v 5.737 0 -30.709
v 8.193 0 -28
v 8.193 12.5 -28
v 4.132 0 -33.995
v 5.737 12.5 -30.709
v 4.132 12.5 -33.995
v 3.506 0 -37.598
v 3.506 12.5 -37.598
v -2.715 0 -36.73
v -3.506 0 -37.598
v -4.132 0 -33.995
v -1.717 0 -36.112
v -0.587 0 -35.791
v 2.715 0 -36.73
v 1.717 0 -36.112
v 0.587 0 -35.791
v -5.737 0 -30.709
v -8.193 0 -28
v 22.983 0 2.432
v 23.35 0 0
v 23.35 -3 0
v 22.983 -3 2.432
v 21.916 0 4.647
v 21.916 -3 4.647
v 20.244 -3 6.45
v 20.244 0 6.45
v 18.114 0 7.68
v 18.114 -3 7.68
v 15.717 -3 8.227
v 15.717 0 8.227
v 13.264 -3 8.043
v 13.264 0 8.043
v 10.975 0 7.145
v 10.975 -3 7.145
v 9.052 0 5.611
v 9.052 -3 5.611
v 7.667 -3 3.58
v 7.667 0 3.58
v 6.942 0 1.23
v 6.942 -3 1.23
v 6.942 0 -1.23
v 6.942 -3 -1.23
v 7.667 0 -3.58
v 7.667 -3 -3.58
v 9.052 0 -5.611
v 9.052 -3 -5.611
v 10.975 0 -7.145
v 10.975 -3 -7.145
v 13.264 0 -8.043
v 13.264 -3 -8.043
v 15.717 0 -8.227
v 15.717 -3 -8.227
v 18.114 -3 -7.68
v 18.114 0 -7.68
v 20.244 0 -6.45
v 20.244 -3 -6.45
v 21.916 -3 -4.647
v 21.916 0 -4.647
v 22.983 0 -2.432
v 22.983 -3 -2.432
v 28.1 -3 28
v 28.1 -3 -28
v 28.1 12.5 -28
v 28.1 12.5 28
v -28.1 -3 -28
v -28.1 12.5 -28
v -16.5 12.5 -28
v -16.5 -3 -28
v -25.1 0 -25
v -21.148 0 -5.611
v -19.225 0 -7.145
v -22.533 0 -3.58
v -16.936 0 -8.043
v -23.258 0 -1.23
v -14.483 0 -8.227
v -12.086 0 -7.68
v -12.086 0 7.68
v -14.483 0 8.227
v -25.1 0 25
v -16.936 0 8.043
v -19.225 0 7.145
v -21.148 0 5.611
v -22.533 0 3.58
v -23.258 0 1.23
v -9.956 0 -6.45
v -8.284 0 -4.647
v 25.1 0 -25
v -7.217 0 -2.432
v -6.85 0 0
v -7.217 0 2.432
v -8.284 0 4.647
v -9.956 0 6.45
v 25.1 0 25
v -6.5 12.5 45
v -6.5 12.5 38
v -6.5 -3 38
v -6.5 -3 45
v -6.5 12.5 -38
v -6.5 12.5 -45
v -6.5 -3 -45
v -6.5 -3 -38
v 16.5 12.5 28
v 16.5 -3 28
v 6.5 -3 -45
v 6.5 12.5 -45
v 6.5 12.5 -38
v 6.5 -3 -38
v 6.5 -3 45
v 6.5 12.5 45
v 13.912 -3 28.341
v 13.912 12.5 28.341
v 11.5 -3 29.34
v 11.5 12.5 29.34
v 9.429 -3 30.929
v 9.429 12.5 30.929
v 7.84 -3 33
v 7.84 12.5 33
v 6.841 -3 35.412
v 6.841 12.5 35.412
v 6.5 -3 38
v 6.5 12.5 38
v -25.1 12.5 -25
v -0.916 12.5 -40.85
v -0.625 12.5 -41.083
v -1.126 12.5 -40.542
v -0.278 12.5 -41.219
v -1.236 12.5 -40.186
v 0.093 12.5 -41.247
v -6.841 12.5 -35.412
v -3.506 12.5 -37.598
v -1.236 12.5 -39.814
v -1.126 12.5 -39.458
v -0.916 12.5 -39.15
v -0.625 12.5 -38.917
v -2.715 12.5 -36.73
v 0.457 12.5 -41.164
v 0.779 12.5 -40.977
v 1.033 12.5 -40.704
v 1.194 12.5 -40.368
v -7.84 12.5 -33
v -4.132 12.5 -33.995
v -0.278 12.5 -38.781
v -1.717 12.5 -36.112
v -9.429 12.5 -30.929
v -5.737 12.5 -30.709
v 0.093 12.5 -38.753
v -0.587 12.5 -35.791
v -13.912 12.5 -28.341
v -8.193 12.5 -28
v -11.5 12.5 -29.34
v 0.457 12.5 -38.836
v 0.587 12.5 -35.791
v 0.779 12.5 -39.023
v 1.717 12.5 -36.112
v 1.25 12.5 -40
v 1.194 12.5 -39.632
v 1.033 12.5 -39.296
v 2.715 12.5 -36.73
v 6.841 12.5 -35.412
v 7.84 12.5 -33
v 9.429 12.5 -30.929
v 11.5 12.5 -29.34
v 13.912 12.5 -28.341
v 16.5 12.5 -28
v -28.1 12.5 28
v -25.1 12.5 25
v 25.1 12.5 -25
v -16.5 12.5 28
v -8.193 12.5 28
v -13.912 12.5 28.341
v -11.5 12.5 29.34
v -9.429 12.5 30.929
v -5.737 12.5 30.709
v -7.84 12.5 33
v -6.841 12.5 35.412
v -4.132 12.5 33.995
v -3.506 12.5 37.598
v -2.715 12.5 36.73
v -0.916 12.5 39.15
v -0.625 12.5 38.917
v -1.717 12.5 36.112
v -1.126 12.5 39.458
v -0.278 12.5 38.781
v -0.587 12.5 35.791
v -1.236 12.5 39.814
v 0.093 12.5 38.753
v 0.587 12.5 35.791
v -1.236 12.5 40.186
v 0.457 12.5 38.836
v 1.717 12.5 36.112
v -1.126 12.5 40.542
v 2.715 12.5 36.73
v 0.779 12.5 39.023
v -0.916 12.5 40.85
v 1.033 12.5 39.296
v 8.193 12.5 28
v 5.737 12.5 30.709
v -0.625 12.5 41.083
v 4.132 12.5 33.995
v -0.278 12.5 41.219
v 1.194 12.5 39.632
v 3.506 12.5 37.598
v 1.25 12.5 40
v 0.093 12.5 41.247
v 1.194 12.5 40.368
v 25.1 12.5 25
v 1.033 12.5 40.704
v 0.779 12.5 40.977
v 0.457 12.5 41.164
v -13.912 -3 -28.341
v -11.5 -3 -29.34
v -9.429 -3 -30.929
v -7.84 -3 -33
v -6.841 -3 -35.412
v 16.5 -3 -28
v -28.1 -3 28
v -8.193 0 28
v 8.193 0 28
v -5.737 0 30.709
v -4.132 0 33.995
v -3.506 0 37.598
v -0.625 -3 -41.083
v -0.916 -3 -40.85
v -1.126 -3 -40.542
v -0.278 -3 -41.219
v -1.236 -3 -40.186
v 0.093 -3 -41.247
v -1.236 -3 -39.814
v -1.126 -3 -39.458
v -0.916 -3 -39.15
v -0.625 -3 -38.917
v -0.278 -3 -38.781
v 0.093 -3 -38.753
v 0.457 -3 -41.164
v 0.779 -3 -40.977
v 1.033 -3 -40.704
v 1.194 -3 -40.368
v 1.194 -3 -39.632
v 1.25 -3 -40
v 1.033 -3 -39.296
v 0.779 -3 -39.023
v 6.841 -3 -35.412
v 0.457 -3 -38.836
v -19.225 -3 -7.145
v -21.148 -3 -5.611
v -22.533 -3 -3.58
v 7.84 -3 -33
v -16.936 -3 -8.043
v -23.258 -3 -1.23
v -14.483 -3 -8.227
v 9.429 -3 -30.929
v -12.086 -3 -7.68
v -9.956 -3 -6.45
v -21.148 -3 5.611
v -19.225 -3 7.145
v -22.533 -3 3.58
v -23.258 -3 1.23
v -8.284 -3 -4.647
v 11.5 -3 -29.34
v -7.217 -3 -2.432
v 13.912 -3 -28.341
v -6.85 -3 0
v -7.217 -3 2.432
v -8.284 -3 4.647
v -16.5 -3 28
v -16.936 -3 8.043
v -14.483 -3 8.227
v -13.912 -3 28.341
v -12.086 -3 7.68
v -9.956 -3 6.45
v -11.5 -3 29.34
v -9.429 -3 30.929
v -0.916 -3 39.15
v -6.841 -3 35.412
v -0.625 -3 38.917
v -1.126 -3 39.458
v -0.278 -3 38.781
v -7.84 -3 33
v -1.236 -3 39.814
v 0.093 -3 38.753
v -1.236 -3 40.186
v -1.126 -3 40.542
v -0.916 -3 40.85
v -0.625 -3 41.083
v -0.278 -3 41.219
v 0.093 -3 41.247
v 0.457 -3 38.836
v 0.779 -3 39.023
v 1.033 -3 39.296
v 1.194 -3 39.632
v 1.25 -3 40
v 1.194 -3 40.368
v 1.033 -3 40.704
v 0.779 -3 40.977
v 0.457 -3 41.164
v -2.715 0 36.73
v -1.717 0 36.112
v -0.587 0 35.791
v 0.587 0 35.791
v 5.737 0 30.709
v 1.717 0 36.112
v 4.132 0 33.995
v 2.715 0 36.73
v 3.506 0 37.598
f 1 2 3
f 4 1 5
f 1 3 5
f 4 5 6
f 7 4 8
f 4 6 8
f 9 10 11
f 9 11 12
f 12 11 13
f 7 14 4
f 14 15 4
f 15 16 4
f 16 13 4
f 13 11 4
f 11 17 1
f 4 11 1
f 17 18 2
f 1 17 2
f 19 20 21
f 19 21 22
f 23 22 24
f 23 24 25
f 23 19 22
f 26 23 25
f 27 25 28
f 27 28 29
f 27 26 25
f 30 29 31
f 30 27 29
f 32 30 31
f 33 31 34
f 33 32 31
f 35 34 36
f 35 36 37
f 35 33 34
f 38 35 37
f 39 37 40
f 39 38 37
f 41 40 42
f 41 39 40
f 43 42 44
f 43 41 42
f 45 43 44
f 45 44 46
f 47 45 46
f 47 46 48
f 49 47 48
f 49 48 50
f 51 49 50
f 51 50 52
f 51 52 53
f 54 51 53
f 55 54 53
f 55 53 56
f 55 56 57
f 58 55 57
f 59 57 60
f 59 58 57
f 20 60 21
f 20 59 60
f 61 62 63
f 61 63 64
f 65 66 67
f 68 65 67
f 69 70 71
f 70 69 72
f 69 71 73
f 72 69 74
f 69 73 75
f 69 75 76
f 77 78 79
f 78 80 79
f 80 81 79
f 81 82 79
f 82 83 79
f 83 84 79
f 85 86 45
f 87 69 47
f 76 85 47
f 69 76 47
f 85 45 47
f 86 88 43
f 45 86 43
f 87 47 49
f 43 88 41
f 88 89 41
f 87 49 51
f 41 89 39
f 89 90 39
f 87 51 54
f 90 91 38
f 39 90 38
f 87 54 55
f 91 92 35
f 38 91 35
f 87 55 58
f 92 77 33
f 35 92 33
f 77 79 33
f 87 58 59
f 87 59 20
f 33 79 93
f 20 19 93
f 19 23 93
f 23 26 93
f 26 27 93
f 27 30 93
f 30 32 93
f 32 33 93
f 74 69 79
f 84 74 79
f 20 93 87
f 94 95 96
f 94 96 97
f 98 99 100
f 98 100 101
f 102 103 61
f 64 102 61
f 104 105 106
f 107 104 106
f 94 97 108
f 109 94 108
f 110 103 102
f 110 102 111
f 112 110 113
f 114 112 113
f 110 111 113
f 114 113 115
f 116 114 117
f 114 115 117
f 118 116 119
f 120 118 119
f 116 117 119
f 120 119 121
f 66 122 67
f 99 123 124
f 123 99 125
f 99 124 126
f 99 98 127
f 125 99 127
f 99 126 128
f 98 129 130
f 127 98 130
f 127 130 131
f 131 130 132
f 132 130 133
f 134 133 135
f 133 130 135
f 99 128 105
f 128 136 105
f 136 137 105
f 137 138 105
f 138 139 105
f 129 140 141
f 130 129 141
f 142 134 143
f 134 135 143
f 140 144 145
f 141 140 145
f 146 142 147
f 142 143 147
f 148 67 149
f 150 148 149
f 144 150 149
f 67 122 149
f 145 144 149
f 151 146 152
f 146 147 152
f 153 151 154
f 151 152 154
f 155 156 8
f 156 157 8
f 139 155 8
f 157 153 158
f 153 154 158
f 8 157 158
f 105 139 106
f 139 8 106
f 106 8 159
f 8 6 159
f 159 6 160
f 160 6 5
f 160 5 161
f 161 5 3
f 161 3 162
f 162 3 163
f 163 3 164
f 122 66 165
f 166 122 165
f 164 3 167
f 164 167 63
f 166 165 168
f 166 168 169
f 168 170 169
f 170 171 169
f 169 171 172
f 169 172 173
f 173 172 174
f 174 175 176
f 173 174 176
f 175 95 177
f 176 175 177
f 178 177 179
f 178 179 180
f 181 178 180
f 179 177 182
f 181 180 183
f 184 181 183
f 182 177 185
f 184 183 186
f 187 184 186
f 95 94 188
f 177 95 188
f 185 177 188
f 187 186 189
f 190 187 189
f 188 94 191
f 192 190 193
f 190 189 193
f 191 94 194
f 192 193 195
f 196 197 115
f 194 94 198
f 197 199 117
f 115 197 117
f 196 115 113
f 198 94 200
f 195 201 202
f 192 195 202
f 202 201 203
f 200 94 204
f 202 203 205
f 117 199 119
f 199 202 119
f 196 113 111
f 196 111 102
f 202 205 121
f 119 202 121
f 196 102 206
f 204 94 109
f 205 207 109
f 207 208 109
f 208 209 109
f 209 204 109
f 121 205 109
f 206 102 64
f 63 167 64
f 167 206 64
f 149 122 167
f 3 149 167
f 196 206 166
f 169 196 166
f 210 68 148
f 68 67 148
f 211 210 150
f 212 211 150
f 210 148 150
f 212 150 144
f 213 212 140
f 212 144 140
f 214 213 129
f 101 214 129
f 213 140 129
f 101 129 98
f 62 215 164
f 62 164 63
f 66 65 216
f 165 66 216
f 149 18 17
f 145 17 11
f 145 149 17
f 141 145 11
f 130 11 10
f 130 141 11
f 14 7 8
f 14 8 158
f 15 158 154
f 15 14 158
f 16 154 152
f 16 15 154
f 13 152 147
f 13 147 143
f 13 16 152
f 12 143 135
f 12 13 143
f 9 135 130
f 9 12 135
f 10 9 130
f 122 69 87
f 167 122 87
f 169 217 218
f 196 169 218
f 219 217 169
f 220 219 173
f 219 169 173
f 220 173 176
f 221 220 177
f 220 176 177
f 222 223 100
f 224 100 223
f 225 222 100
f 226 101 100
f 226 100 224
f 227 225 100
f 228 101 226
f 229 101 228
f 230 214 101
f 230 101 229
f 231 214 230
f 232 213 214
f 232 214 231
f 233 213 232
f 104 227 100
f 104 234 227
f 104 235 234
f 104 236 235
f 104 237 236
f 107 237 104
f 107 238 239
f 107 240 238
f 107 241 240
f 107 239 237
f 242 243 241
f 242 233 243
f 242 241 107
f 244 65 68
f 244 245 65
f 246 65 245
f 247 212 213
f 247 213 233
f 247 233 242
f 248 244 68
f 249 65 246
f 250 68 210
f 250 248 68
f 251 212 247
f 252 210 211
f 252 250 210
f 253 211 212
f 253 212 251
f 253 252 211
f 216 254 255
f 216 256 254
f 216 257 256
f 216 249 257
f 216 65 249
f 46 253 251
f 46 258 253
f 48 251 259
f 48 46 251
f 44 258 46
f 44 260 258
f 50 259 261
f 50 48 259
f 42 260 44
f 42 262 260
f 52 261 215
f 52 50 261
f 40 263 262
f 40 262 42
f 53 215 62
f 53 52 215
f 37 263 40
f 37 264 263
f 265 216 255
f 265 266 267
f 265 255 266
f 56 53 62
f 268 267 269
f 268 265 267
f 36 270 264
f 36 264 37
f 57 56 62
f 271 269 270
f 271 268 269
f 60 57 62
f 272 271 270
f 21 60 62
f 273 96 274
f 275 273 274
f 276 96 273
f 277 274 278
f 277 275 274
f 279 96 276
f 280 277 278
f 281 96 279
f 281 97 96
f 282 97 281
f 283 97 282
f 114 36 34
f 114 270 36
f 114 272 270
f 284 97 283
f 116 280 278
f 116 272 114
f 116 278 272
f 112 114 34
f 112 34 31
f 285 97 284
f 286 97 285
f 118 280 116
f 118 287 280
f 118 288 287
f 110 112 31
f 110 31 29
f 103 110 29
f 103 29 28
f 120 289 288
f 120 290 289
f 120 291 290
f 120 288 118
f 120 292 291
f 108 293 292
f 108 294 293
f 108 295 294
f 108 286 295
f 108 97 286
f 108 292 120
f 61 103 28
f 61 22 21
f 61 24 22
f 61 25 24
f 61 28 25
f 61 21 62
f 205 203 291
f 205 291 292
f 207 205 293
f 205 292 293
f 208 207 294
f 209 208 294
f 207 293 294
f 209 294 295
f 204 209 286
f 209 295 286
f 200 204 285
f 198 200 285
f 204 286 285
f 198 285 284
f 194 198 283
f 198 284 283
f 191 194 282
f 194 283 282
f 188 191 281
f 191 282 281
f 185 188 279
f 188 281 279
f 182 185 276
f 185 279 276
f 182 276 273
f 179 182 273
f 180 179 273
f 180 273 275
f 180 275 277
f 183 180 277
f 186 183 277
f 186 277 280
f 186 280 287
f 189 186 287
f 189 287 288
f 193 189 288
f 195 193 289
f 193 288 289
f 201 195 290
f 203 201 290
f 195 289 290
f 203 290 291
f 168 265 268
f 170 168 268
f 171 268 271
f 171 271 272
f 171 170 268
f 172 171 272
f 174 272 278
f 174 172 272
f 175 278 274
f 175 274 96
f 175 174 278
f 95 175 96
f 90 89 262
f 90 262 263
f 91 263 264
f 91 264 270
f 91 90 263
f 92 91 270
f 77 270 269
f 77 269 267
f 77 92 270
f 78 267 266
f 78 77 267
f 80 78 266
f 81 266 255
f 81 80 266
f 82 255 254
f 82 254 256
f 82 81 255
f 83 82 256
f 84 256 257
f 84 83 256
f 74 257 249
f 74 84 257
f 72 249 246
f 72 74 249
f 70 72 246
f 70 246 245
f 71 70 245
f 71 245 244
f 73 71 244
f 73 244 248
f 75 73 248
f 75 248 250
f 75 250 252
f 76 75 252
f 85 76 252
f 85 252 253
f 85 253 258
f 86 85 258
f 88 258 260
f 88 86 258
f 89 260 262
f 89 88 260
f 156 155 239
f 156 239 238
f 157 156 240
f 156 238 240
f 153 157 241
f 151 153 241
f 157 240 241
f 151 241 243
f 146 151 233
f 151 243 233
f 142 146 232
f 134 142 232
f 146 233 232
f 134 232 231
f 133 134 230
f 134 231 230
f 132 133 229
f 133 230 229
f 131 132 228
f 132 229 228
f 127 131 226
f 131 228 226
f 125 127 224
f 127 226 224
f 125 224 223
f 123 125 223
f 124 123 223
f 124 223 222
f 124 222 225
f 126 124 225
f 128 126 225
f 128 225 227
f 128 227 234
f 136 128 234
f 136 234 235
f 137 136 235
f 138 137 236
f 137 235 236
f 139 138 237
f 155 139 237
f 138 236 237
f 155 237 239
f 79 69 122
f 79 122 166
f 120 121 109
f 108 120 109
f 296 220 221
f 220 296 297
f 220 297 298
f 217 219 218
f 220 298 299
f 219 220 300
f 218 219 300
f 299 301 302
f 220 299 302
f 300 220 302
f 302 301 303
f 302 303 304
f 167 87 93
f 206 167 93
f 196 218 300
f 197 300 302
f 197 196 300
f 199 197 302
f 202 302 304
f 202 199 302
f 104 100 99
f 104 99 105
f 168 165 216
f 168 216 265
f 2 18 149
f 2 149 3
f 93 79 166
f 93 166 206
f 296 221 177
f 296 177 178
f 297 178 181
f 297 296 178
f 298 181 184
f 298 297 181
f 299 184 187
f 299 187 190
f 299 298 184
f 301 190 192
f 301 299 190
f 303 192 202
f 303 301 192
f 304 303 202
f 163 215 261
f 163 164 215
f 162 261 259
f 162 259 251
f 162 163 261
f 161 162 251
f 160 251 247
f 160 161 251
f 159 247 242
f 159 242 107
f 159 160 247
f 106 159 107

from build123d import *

# Parameters (mm, degrees)
F0_W        = 56.2
F0_H        = 56
F0_W_2      = 50.2
F0_H_2      = 50
F0_R        = 8.25
F1_DEPTH    = 3
F2_DEPTH    = 12.5
F3_W        = 13
F3_H        = 17
F3_R        = 1.25
F4_DEPTH    = 15.5
F5_R        = 10
F6_T        = 3
F6_T3_DEPTH = 56.2
F6_T5_DEPTH = 56
F6_T7_DEPTH = 18.5


# Not quite as in the source:
# - a shell that OpenCascade refuses in one call is made with other operations: the cavity is built on its own and cut out


with BuildPart() as f1:
    # F0 (on Front) → F1 (new body)
    with BuildSketch(Plane.XZ):
        Rectangle(F0_W, F0_H)
        Rectangle(F0_W_2, F0_H_2, mode=Mode.SUBTRACT)
        Rectangle(F0_W_2, F0_H_2)
        with Locations((-15.1, 0)):
            Circle(F0_R, mode=Mode.SUBTRACT)
        with Locations((15.1, 0)):
            Circle(F0_R, mode=Mode.SUBTRACT)
    extrude(amount=F1_DEPTH)

    # F0 (on Front) → F2 (join)
    with BuildSketch(Plane.XZ):
        Rectangle(F0_W, F0_H)
        Rectangle(F0_W_2, F0_H_2, mode=Mode.SUBTRACT)
    extrude(amount=-F2_DEPTH)

    # F3 (on face) → F4 (join, through all)
    with BuildSketch(Plane.XZ.offset(3)):
        with Locations((0, 36.5)):
            Rectangle(F3_W, F3_H)
        with Locations((0, 40)):
            Circle(F3_R, mode=Mode.SUBTRACT)
        with Locations((0, -36.5)):
            Rectangle(F3_W, F3_H)
        with Locations((0, -40)):
            Circle(F3_R, mode=Mode.SUBTRACT)
    extrude(amount=-F4_DEPTH)

    # F5
    f5_edges = [f1.edges().sort_by_distance(p)[0] for p in [
        (6.5, 4.75, -28),
        (-6.5, 4.75, -28),
        (-6.5, 4.75, 28),
        (6.5, 4.75, 28),
    ]]
    fillet(f5_edges, radius=F5_R)

    # F6: shell of thickness 3, made by hand


with BuildPart() as f6_core1:
    # F6_t2: copy of F1
    add(f1.part)

    # the walls: a layer under each face that stays
    f6_faces = [f6_core1.faces().sort_by_distance(p)[0] for p in [
        (0, -3, 0),
        (22.3, 4.75, 28),
        (9.4289321881, 4.75, 30.9289321881),
        (28.1, 4.75, 0),
        (6.5, 4.75, 41.5),
        (22.3, 4.75, -28),
        (0, 4.75, 45),
        (9.4289321881, 4.75, -30.9289321881),
        (-6.5, 4.75, 41.5),
        (6.5, 4.75, -41.5),
        (-9.4289321881, 4.75, 30.9289321881),
        (0, 4.75, -45),
        (-22.3, 4.75, 28),
        (-6.5, 4.75, -41.5),
        (-28.1, 4.75, 0),
        (-9.4289321881, 4.75, -30.9289321881),
        (-22.3, 4.75, -28),
        (-23.35, -1.5, 0),
        (6.85, -1.5, 0),
        (-1.25, 4.75, 40),
        (-1.25, 4.75, -40),
        (0, 0, 0),
        (0, 6.25, 25),
        (25.1, 6.25, 0),
        (0, 6.25, -25),
        (-25.1, 6.25, 0),
    ]]
    thicken(f6_faces, amount=-F6_T, mode=Mode.SUBTRACT)

    # F6_s4 → F6_t3 (cut)
    with BuildSketch(Plane.YZ.offset(-28.1)):
        Polygon((0.03, 24.97), (-3, 25), (-3, 28), (0, 28), align=None)
        Polygon((0.03, -24.97), (-3, -25), (-3, -28), (0, -28), align=None)
    extrude(amount=F6_T3_DEPTH, mode=Mode.SUBTRACT)

    # F6_s6 → F6_t5 (cut)
    with BuildSketch(Plane.XY.offset(-28)):
        Polygon((25.07, 0.03), (25.1, -3), (28.1, -3), (28.1, 0), align=None)
        Polygon((-25.07, 0.03), (-25.1, -3), (-28.1, -3), (-28.1, 0), align=None)
    extrude(amount=F6_T5_DEPTH, mode=Mode.SUBTRACT)

    # F6_s8 → F6_t7 (cut)
    with BuildSketch(Plane.XZ.offset(-15.5)):
        Polygon((-25.07, 24.97), (-25.1, 28), (-28.1, 28), (-28.1, 25), align=None)
        Polygon((25.07, 24.97), (25.1, 28), (28.1, 28), (28.1, 25), align=None)
        Polygon((25.07, -24.97), (28.1, -25), (28.1, -28), (25.1, -28), align=None)
        Polygon((-25.07, -24.97), (-25.1, -28), (-28.1, -28), (-28.1, -25), align=None)
    extrude(amount=F6_T7_DEPTH, mode=Mode.SUBTRACT)


with BuildPart() as f1_1:
    add(f1.part)

    # what is left inside the walls is the cavity
    f6_cavity = [f6_core1.part.solids().sort_by_distance(p)[0] for p in [
        (0, 8.333333, 28.03),
        (0, 8.333333, -28.03),
    ]]
    add(f6_cavity, mode=Mode.SUBTRACT)


solid = f1_1.part
